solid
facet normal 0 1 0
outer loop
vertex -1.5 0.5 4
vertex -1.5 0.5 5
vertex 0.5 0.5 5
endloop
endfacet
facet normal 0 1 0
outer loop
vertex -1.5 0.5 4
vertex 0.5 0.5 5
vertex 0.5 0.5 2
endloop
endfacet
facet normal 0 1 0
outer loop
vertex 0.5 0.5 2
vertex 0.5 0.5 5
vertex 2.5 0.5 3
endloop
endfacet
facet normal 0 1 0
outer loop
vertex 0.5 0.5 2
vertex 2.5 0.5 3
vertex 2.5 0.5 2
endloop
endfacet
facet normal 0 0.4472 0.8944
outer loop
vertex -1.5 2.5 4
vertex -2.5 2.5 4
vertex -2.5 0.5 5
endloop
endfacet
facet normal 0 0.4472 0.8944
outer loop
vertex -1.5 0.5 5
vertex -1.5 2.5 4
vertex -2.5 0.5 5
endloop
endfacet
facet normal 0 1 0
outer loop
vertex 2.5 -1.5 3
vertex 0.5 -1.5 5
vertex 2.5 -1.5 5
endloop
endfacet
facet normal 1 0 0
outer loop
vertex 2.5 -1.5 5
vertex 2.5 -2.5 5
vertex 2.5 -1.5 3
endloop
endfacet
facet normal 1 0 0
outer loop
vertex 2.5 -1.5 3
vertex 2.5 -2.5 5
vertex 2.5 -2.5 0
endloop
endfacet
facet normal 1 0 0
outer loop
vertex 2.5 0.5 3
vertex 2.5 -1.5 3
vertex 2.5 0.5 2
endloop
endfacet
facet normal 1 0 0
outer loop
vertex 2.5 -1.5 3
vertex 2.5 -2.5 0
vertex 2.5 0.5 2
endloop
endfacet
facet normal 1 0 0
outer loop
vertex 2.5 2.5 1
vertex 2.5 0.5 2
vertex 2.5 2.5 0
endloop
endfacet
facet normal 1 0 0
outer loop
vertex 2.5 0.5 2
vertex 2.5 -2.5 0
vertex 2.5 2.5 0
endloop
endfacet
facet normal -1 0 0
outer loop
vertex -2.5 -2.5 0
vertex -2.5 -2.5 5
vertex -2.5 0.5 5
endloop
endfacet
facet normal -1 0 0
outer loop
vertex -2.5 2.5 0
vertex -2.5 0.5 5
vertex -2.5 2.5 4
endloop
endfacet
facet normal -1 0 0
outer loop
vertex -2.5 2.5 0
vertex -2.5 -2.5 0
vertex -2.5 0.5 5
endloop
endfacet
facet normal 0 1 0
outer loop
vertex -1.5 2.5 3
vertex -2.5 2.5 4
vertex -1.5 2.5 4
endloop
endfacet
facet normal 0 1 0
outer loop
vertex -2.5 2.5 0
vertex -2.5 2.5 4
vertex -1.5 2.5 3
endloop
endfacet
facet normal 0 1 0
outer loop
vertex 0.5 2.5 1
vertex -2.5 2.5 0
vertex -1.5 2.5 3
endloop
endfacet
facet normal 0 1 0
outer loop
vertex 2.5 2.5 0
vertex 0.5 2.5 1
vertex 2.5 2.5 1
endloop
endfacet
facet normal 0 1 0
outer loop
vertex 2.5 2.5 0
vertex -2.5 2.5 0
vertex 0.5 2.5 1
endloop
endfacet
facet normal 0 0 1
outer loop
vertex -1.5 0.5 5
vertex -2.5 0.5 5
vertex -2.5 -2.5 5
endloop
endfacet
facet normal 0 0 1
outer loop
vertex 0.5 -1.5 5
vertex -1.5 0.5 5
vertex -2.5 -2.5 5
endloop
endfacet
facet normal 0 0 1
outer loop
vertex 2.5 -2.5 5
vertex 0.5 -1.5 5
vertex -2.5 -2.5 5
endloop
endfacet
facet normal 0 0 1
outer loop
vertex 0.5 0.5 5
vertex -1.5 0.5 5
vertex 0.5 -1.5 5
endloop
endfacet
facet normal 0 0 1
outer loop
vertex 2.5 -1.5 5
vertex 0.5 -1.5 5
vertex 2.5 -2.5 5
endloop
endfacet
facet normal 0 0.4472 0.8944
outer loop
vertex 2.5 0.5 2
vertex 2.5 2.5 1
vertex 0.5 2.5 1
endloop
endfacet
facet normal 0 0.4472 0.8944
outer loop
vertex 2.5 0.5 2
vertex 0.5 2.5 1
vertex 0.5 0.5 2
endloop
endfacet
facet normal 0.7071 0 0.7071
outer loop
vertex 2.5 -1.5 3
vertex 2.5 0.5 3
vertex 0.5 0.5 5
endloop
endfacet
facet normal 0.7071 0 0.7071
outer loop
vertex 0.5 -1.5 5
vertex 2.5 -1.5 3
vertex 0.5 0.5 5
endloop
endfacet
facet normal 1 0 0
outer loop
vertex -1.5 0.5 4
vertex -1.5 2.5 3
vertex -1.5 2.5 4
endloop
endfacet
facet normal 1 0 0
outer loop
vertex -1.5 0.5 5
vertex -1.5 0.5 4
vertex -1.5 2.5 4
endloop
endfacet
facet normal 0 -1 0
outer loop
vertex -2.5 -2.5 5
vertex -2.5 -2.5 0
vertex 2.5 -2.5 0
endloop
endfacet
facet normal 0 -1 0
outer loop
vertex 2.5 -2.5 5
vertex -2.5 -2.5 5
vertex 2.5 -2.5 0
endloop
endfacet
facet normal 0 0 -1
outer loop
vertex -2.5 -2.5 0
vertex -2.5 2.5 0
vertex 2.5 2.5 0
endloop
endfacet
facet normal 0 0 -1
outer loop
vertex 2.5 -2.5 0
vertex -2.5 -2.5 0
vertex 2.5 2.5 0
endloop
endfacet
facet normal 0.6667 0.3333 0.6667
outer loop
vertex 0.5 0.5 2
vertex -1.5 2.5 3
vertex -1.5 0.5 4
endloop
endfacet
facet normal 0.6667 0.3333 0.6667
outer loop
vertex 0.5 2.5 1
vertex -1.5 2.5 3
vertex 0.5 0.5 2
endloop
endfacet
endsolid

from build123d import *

# Parameters (mm, degrees)
SKETCH1_W           = 5
SKETCH1_H           = 5
BOSS_EXTRUDE1_DEPTH = 5
CUT_EXTRUDE1_DEPTH  = 4
CUT_EXTRUDE2_DEPTH  = 1
SKETCH5_W           = 2
SKETCH5_H           = 2
CUT_EXTRUDE9_DEPTH  = 3
CUT_EXTRUDE10_DEPTH = 2
SKETCH11_W          = 1
SKETCH11_H          = 2
CUT_EXTRUDE11_DEPTH = 2
CUT_EXTRUDE14_DEPTH = 5
CUT_EXTRUDE15_DEPTH = 2
CUT_EXTRUDE16_DEPTH = 2


with BuildPart() as part:
    # Sketch1 → Boss-Extrude1 (new body)
    with BuildSketch(Plane.XY):
        Rectangle(SKETCH1_W, SKETCH1_H)
    extrude(amount=BOSS_EXTRUDE1_DEPTH)

    # Sketch2 → Cut-Extrude1 (cut)
    with BuildSketch(Plane(origin=(0, 2.5, 0), x_dir=(1, 0, 0), z_dir=(0, 1, 0))):
        Polygon((2.5, -5), (2.5, -3), (0.5, -5), align=None)
    extrude(amount=-CUT_EXTRUDE1_DEPTH, mode=Mode.SUBTRACT)

    # Sketch4 → Cut-Extrude2 (cut)
    with BuildSketch(Plane.ZY.offset(2.5)):
        Polygon((5, 2.5), (4, 2.5), (5, 0.5), align=None)
    extrude(amount=-CUT_EXTRUDE2_DEPTH, mode=Mode.SUBTRACT)

    # Sketch5 → Cut-Extrude9 (cut)
    with BuildSketch(Plane.XY.offset(5)):
        with Locations((1.5, 1.5)):
            Rectangle(SKETCH5_W, SKETCH5_H)
    extrude(amount=-CUT_EXTRUDE9_DEPTH, mode=Mode.SUBTRACT)

    # Sketch10 → Cut-Extrude10 (cut)
    with BuildSketch(Plane(origin=(2.5, 0, 0), x_dir=(0, 0, -1), z_dir=(1, 0, 0))):
        Polygon((-1, 2.5), (-2, 0.5), (-2, 2.5), align=None)
    extrude(amount=-CUT_EXTRUDE10_DEPTH, mode=Mode.SUBTRACT)

    # Sketch11 → Cut-Extrude11 (cut)
    with BuildSketch(Plane(origin=(0.5, 0, 0), x_dir=(0, 0, -1), z_dir=(1, 0, 0))):
        with Locations((-4.5, 1.5)):
            Rectangle(SKETCH11_W, SKETCH11_H)
    extrude(amount=-CUT_EXTRUDE11_DEPTH, mode=Mode.SUBTRACT)

    # Sketch16 → Cut-Extrude14 (cut, through all)
    with BuildSketch(Plane(origin=(1.222222222, 0.611111111, 1.222222222), x_dir=(-0.745355992, 0.298142397, 0.596284794), z_dir=(-0.666666667, -0.333333333, -0.666666667))):
        Polygon((0.96896279, -0.447213595), (0.96896279, 1.788854382), (3.652244363, 0.894427191), (3.652244363, -1.341640786), align=None)
    extrude(amount=-CUT_EXTRUDE14_DEPTH, mode=Mode.SUBTRACT)

    # Sketch17 → Cut-Extrude15 (cut)
    with BuildSketch(Plane(origin=(-1.5, 0, 0), x_dir=(0, 0, -1), z_dir=(1, 0, 0))):
        Polygon((-3, 2.5), (-4, 0.5), (-4, 2.5), align=None)
    extrude(amount=CUT_EXTRUDE15_DEPTH, mode=Mode.SUBTRACT)

    # Sketch18 → Cut-Extrude16 (cut)
    with BuildSketch(Plane(origin=(0, 0.5, 0), x_dir=(1, 0, 0), z_dir=(0, 1, 0))):
        Polygon((0.5, -4), (0.5, -2), (-1.5, -4), align=None)
    extrude(amount=CUT_EXTRUDE16_DEPTH, mode=Mode.SUBTRACT)


solid = part.part
